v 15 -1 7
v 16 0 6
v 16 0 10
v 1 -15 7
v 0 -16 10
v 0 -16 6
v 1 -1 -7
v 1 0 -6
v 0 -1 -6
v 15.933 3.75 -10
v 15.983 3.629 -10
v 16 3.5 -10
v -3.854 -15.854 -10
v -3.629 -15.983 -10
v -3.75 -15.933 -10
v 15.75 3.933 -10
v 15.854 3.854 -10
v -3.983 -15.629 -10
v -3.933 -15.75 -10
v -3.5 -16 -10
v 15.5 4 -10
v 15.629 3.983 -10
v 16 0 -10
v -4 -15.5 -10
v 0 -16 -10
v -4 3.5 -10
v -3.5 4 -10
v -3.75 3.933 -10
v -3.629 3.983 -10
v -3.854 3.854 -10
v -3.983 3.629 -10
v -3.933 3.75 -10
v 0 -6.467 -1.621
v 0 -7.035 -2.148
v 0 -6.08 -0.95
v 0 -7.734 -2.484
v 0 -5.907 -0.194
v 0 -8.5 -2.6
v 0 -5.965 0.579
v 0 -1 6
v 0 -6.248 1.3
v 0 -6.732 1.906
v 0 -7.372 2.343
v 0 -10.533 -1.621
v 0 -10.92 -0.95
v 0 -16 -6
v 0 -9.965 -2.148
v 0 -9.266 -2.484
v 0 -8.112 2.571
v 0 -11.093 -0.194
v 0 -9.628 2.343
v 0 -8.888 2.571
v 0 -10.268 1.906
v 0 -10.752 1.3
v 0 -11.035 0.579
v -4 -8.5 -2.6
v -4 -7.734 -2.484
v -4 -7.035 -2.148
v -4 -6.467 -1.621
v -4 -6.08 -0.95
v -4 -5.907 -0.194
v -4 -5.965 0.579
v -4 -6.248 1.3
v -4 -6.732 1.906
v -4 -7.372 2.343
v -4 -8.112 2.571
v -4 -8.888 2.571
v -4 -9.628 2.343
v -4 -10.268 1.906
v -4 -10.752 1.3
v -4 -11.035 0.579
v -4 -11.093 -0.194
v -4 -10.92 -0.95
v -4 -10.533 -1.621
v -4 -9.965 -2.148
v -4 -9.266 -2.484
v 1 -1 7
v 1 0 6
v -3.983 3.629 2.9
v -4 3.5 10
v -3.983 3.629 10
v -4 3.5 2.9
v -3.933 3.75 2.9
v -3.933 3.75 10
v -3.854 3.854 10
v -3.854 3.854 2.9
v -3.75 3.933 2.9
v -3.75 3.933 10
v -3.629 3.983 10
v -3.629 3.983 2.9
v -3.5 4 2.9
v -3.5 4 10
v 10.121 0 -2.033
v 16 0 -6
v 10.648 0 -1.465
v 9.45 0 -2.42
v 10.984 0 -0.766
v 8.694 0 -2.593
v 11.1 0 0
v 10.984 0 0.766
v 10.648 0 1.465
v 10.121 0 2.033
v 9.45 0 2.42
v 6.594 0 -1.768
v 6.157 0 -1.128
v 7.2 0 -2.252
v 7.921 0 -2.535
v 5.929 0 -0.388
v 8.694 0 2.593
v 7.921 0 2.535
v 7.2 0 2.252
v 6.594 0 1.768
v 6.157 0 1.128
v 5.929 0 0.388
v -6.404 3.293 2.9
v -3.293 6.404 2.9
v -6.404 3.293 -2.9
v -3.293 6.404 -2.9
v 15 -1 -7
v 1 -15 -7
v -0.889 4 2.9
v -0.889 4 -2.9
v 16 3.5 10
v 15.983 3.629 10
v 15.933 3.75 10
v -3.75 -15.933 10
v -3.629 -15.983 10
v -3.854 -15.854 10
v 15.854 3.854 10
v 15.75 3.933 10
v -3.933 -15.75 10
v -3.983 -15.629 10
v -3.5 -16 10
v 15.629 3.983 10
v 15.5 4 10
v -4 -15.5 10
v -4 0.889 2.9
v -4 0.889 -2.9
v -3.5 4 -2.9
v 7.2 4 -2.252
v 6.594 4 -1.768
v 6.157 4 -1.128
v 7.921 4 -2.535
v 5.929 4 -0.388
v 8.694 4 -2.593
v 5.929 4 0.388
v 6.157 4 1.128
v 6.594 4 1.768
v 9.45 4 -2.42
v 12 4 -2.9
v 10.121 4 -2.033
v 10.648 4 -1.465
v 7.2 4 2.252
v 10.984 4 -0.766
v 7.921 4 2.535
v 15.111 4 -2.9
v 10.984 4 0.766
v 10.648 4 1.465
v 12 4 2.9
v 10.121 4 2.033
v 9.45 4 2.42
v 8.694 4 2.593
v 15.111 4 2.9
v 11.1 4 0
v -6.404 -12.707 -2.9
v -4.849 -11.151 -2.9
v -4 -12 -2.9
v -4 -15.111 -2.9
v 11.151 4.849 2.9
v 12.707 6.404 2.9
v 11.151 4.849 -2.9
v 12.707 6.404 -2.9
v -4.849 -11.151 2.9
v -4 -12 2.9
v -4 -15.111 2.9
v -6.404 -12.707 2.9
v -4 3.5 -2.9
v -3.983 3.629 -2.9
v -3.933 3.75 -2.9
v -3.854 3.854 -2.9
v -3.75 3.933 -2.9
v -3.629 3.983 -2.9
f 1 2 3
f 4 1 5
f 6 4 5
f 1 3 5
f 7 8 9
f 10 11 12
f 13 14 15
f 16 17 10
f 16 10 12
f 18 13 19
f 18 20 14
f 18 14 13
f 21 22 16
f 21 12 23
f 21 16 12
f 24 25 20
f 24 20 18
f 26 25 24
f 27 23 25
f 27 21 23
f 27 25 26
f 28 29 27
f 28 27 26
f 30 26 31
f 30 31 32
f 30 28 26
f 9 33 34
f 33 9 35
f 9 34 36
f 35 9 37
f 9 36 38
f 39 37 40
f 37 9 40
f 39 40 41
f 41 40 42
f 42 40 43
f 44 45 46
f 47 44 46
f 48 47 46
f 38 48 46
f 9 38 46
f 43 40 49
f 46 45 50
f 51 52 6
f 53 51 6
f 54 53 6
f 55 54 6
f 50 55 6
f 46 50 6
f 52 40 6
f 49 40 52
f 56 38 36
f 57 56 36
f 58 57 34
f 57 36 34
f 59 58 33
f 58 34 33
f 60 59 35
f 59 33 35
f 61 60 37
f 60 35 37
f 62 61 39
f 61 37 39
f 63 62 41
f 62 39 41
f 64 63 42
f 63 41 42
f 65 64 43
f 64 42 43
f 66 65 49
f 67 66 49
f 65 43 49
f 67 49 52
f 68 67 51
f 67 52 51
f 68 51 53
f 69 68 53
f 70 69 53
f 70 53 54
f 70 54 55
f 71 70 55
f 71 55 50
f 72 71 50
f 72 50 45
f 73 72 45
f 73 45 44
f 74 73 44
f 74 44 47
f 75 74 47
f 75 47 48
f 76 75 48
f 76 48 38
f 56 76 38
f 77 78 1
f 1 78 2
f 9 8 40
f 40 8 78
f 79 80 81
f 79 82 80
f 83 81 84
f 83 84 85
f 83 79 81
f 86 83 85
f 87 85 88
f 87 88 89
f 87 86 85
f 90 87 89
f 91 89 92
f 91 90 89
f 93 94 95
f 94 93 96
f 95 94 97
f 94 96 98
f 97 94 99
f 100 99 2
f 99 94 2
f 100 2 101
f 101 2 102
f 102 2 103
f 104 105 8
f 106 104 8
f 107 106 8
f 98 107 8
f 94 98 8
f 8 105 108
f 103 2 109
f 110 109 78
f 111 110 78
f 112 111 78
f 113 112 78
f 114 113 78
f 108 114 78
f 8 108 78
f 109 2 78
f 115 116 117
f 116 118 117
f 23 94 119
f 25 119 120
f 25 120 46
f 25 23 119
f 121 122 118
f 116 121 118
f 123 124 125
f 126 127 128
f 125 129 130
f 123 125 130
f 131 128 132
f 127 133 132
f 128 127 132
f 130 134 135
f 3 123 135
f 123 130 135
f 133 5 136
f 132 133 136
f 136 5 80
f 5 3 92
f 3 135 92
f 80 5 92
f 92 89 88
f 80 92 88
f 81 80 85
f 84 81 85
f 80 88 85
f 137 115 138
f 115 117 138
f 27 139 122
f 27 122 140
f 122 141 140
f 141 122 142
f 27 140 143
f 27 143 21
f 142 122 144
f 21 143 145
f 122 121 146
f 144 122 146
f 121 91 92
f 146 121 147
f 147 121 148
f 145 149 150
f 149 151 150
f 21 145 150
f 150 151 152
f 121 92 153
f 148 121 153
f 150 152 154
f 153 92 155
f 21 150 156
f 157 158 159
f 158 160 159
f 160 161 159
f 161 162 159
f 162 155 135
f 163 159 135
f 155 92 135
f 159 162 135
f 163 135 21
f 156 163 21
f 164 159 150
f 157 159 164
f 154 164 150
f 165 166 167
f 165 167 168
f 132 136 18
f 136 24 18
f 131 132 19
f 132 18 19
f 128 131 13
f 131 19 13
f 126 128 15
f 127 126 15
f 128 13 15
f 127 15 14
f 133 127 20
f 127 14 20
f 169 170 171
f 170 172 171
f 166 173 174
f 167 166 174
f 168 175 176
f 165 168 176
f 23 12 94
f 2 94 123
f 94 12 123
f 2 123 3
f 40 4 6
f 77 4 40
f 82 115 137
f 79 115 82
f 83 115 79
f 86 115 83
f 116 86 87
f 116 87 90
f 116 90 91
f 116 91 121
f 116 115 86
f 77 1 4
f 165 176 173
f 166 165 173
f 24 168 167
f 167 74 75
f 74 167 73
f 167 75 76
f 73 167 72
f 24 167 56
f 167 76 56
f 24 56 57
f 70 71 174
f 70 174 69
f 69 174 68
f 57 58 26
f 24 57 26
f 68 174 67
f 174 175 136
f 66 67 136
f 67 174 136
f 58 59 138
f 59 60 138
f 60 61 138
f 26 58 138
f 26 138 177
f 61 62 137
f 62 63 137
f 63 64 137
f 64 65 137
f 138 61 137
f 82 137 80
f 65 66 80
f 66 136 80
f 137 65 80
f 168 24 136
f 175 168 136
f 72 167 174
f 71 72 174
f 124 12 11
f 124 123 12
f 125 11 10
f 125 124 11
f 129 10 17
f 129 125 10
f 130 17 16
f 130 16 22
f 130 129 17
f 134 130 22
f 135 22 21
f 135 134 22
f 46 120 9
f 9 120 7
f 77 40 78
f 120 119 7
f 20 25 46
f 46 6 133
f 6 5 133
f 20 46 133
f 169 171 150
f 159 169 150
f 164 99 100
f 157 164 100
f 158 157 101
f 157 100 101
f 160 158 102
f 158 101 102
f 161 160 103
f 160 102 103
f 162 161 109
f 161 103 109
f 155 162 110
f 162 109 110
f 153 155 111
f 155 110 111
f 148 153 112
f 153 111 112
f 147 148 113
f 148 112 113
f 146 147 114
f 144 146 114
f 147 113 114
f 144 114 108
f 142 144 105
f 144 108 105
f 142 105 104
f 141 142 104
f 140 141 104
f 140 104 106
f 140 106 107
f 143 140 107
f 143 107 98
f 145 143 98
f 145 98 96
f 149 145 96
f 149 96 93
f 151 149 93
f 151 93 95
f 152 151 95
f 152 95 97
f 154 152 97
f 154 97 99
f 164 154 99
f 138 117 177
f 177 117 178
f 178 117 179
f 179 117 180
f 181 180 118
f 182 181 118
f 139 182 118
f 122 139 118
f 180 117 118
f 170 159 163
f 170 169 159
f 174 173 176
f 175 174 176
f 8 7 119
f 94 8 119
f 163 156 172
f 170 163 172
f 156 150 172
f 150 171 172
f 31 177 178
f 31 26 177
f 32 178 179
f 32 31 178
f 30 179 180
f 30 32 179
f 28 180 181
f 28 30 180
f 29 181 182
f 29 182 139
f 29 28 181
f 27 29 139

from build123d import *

# Parameters (mm, degrees)
EXTRUDE_1_DEPTH     = 10
EXTRUDE_2_DEPTH     = 3
SKETCH_3_R          = 2.6
CUT_EXTRUDE_1_DEPTH = 25.738633754
SKETCH_4_R          = 2.6
CUT_EXTRUDE_2_DEPTH = 25.738633754
EXTRUDE_START       = -10
EXTRUDE_3_DEPTH     = 2.9
FILLET_1_R          = 0.5
CHAMFER_1_SIZE      = 1


with BuildPart() as part:
    # Эскиз1 → Бобышка-Вытянуть1 (new, symmetric)
    with BuildSketch(Plane.XY):
        Polygon((0, 0), (0, -16), (-4, -16), (-4, 4), (16, 4), (16, 0), align=None)
    extrude(amount=EXTRUDE_1_DEPTH, both=True)

    # Эскиз2 → Бобышка-Вытянуть2 (add)
    with BuildSketch(Plane.XY.offset(10)):
        Polygon((0, -16), (0, 0), (16, 0), align=None)
    extrude_2 = extrude(amount=-EXTRUDE_2_DEPTH)

    # Зеркальное отражение1: Бобышка-Вытянуть2 across plane
    add(extrude_2.mirror(Plane.XY))

    # Эскиз3 → Вырез-Вытянуть1 (cut, through all)
    with BuildSketch(Plane(origin=(0, 0, 0), x_dir=(0, 0, -1), z_dir=(1, 0, 0))):
        with Locations((0, -8.5)):
            Circle(SKETCH_3_R)
        with Locations((20, -8.5)):
            Circle(SKETCH_3_R)
        with Locations((20, 11.5)):
            Circle(SKETCH_3_R)
        with Locations((0, 11.5)):
            Circle(SKETCH_3_R)
    extrude(amount=-CUT_EXTRUDE_1_DEPTH, mode=Mode.SUBTRACT)

    # Эскиз4 → Вырез-Вытянуть2 (cut, through all)
    with BuildSketch(Plane.XZ):
        with Locations((8.5, 0)):
            Circle(SKETCH_4_R)
        with Locations((-11.5, 0)):
            Circle(SKETCH_4_R)
        with Locations((-11.5, 20)):
            Circle(SKETCH_4_R)
        with Locations((8.5, 20)):
            Circle(SKETCH_4_R)
    extrude(amount=-CUT_EXTRUDE_2_DEPTH, mode=Mode.SUBTRACT)

    # Эскиз5 → Бобышка-Вытянуть3 (add, symmetric)
    with BuildSketch(Plane.XY.offset(10).offset(EXTRUDE_START)):
        Polygon((-0.888730163, 4), (-3.292893219, 6.404163056), (-6.404163056, 3.292893219), (-4, 0.888730163), (-4, 4), align=None)
        Polygon((16, 3.111269837), (12.707106781, 6.404163056), (11.151471863, 4.848528137), (16, 0), align=None)
        Polygon((-4.848528137, -11.151471863), (0, -16), (-3.111269837, -16), (-6.404163056, -12.707106781), align=None)
    extrude(amount=EXTRUDE_3_DEPTH, both=True)

    # Скругление1
    fillet_1_edges = [part.edges().sort_by_distance(p)[0] for p in [
        (-4, -16, 0),
        (-4, 4, 6.45),
        (16, 4, 0),
        (-4, 4, -6.45),
    ]]
    fillet(fillet_1_edges, radius=FILLET_1_R)

    # Фаска1
    chamfer_1_edges = [part.edges().sort_by_distance(p)[0] for p in [
        (0, 0, 0),
        (0, -8, 7),
        (8, 0, 7),
        (8, 0, -7),
        (0, -8, -7),
    ]]
    chamfer(chamfer_1_edges, length=CHAMFER_1_SIZE)


solid = part.part
